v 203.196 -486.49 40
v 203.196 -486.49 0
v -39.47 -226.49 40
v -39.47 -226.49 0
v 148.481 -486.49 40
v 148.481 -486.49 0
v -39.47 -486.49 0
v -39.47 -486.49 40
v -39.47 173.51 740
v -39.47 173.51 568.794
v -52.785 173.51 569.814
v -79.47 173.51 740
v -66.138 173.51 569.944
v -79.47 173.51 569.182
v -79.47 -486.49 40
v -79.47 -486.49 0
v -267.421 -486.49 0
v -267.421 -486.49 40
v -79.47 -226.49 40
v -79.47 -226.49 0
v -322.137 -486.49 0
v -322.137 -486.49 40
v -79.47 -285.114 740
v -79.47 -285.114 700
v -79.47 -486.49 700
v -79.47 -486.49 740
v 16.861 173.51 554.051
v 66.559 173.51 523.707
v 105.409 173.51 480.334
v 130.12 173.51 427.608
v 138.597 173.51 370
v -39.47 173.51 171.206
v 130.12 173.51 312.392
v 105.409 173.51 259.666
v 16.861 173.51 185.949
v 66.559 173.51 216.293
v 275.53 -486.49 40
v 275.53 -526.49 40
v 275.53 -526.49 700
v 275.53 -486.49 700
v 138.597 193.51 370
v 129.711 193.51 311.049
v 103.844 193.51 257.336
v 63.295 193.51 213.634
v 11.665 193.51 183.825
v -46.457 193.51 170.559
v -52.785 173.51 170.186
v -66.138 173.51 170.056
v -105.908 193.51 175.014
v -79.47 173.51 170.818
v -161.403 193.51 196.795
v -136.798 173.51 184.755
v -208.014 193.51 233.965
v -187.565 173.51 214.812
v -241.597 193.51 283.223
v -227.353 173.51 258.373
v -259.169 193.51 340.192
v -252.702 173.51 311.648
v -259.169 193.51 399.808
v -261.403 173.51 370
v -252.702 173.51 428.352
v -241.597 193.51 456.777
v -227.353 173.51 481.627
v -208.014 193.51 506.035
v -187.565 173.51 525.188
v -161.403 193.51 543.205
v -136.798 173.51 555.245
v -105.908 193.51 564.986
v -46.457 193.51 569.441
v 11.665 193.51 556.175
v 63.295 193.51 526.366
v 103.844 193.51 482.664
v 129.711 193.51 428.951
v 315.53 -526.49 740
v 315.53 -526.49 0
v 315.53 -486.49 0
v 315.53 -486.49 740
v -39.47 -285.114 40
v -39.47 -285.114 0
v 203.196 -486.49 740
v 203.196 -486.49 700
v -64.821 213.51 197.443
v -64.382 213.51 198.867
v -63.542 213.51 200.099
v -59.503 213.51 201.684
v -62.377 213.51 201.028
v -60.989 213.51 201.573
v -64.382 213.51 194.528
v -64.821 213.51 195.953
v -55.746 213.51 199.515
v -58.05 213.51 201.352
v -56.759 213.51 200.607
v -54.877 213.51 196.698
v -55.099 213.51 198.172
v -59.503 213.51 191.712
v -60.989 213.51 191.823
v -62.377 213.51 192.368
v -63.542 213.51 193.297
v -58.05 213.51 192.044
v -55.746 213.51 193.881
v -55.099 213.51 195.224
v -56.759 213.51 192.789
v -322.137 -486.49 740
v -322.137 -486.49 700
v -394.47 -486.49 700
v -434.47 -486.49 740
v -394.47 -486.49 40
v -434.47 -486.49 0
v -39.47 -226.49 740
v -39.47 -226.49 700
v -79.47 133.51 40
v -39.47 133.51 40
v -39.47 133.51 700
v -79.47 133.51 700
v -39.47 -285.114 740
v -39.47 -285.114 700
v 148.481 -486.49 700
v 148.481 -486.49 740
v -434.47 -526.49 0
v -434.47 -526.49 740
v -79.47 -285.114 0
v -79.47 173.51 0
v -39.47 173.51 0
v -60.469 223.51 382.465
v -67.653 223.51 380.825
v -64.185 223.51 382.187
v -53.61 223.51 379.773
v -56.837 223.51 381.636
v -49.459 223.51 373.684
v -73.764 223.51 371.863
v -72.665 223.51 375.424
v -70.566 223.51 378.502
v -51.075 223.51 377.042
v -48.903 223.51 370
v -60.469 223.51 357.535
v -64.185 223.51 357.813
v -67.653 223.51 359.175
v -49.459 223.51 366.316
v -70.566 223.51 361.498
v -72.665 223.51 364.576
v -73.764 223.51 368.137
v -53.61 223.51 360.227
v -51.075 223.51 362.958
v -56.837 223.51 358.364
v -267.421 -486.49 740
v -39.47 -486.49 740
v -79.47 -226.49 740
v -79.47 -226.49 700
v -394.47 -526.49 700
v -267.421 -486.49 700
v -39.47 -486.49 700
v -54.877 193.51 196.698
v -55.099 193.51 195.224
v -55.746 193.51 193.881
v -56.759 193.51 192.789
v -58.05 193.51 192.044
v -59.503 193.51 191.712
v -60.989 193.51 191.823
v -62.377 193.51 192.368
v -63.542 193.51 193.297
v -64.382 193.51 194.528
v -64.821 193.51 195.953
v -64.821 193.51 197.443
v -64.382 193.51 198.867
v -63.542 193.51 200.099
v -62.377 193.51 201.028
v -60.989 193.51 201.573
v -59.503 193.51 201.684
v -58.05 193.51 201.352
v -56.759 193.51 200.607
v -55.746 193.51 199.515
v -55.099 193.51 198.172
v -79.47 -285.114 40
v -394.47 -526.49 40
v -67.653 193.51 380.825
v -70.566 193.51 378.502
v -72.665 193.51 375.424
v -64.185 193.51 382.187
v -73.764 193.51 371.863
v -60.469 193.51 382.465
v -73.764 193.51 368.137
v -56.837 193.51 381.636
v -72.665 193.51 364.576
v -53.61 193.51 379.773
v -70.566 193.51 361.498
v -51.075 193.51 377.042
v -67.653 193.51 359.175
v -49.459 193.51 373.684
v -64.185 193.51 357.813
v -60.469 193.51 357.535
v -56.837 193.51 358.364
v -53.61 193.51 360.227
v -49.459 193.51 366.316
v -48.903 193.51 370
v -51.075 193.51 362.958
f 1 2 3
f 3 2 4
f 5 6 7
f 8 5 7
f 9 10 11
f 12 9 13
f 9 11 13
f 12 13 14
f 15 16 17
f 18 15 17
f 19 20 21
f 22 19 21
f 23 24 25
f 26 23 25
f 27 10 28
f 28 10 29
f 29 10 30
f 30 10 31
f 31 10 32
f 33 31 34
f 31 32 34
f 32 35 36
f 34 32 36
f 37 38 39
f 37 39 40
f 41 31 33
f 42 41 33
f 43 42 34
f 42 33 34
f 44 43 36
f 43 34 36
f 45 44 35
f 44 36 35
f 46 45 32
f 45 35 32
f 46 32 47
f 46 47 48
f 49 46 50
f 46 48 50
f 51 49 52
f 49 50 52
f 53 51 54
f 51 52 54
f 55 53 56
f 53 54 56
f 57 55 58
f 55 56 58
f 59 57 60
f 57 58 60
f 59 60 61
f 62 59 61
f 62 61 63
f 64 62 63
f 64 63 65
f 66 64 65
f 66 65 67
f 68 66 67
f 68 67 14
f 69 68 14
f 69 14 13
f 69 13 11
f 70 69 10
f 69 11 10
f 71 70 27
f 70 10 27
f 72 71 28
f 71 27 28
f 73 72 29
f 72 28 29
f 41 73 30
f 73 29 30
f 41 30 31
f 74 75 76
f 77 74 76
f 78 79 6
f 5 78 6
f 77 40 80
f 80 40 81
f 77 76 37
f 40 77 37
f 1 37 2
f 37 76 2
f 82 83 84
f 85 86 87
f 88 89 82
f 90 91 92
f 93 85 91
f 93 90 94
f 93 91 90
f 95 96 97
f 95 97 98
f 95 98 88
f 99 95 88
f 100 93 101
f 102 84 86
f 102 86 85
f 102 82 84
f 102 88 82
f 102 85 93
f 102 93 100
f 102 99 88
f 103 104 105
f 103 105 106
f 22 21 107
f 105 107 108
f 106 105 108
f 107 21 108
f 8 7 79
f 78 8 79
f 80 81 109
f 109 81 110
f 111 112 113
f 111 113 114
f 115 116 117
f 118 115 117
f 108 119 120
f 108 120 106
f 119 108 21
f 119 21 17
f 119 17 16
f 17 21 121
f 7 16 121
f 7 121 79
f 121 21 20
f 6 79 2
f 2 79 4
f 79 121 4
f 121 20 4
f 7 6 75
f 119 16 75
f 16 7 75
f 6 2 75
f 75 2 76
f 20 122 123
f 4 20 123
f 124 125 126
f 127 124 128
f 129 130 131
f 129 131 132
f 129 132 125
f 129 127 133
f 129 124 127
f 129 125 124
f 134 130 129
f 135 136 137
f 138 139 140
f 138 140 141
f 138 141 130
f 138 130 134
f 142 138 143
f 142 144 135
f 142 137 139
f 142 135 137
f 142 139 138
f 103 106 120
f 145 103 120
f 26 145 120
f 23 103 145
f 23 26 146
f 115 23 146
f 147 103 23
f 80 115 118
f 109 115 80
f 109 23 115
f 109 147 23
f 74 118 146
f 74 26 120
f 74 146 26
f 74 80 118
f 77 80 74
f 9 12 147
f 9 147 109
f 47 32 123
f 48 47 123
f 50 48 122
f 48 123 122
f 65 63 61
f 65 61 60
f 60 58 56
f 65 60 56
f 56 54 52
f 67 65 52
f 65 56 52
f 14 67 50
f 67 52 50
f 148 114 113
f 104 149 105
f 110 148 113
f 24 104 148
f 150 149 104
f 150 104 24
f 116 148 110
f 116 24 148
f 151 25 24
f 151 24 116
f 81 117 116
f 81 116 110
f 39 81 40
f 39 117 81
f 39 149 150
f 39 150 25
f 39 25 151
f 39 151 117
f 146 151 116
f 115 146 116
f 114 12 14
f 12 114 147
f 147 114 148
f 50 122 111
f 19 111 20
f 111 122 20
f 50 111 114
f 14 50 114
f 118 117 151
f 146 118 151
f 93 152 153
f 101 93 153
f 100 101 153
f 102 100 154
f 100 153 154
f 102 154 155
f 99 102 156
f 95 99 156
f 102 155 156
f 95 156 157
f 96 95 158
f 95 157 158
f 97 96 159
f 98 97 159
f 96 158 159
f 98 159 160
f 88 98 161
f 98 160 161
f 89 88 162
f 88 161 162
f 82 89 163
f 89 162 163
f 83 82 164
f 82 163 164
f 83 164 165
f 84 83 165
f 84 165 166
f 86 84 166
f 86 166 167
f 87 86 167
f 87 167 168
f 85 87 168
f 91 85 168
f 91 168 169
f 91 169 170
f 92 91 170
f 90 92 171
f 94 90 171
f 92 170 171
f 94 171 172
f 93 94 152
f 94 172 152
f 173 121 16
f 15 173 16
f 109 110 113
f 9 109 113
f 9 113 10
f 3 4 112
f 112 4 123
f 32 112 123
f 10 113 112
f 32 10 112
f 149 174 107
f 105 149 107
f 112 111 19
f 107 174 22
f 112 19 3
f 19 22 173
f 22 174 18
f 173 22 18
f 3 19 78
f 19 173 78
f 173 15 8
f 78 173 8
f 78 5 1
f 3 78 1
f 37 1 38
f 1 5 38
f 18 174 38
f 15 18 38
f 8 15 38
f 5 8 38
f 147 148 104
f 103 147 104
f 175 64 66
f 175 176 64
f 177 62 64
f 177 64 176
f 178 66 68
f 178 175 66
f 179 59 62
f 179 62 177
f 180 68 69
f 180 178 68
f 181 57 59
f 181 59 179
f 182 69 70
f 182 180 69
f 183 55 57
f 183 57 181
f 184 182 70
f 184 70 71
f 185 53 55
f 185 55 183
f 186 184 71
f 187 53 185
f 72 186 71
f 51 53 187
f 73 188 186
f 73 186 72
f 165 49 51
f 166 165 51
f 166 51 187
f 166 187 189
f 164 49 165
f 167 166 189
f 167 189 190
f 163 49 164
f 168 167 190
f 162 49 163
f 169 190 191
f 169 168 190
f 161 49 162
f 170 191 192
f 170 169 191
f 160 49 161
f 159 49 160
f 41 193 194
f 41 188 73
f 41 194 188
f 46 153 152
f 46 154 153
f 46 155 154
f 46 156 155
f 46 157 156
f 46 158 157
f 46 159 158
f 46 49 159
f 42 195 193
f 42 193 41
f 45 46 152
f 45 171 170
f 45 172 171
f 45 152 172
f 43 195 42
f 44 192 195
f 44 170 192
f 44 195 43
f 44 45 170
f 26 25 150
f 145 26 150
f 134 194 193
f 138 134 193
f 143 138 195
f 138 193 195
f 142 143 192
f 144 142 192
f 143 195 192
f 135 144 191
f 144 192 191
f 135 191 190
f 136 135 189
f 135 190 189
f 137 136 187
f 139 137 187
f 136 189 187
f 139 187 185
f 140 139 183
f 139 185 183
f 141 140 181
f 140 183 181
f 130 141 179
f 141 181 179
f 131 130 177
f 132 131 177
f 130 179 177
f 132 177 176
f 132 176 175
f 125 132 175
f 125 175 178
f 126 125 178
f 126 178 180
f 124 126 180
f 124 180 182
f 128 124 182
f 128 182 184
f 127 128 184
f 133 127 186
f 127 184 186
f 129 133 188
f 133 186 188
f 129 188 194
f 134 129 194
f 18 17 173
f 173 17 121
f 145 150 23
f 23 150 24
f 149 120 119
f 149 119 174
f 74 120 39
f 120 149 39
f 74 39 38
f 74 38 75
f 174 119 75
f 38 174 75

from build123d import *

# Parameters (mm, degrees)
BOSS_EXTRUDE1_DEPTH  = 740
SKETCH2_W            = 720
SKETCH2_H            = 660
CUT_EXTRUDE1_DEPTH   = 760
SKETCH4_W            = 25
SKETCH4_H            = 40
CUT_EXTRUDE2_DEPTH   = 817
SKETCH5_W            = 40
SKETCH5_H            = 40
BOSS_EXTRUDE2_DEPTH  = 740
SKETCH6_W            = 40
SKETCH6_H            = 40
BOSS_EXTRUDE3_DEPTH  = 740
SKETCH7_R            = 200
BOSS_EXTRUDE5_DEPTH  = 20
SKETCH8_R            = 12.5
BOSS_EXTRUDE6_DEPTH  = 30
SKETCH9_R            = 5
BOSS_EXTRUDE10_DEPTH = 20


with BuildPart() as part:
    # Sketch1 → Boss-Extrude1 (new body)
    with BuildSketch(Plane.XY):
        Polygon((-79.470198675, 173.509933775), (-79.470198675, -226.490066225), (-322.136865342, -486.490066225), (-459.470198675, -486.490066225), (-459.470198675, -526.490066225), (340.529801325, -526.490066225), (340.529801325, -486.490066225), (203.196467991, -486.490066225), (-39.470198675, -226.490066225), (-39.470198675, 173.509933775), align=None)
        Polygon((-79.470198675, -486.490066225), (-267.421439932, -486.490066225), (-79.470198675, -285.113736307), align=None, mode=Mode.SUBTRACT)
        Polygon((148.481042581, -486.490066225), (-39.470198675, -486.490066225), (-39.470198675, -285.113736307), align=None, mode=Mode.SUBTRACT)
    extrude(amount=BOSS_EXTRUDE1_DEPTH)

    # Sketch2 → Cut-Extrude1 (cut)
    with BuildSketch(Plane.XZ.offset(526.490066225)):
        with Locations((-59.470198675, 370)):
            Rectangle(SKETCH2_W, SKETCH2_H)
    extrude(amount=-CUT_EXTRUDE1_DEPTH, mode=Mode.SUBTRACT)

    # Sketch4 → Cut-Extrude2 (cut)
    with BuildSketch(Plane(origin=(0, 0, 0), x_dir=(-1, 0, 0), z_dir=(0, 0, -1))):
        with Locations((-328.029801325, -506.490066225)):
            Rectangle(SKETCH4_W, SKETCH4_H)
        with Locations((446.970198675, -506.490066225)):
            Rectangle(SKETCH4_W, SKETCH4_H)
    extrude(amount=-CUT_EXTRUDE2_DEPTH, mode=Mode.SUBTRACT)

    # Sketch5 → Boss-Extrude2 (add)
    with BuildSketch(Plane(origin=(0, 0, 0), x_dir=(-1, 0, 0), z_dir=(0, 0, -1))):
        with Locations((-295.529801325, -506.490066225)):
            Rectangle(SKETCH5_W, SKETCH5_H)
        with Locations((414.470198675, -506.490066225)):
            Rectangle(SKETCH5_W, SKETCH5_H)
    extrude(amount=-BOSS_EXTRUDE2_DEPTH)

    # Sketch6 → Boss-Extrude3 (add)
    with BuildSketch(Plane(origin=(0, 0, 0), x_dir=(-1, 0, 0), z_dir=(0, 0, -1))):
        with Locations((59.470198675, 153.509933775)):
            Rectangle(SKETCH6_W, SKETCH6_H)
    extrude(amount=-BOSS_EXTRUDE3_DEPTH)

    # Sketch7 → Boss-Extrude5 (add)
    with BuildSketch(Plane(origin=(0, 173.509933775, 0), x_dir=(1, 0, 0), z_dir=(0, 1, 0))):
        with Locations((-61.40332894, -370)):
            Circle(SKETCH7_R)
    extrude(amount=BOSS_EXTRUDE5_DEPTH)

    # Sketch8 → Boss-Extrude6 (add)
    with BuildSketch(Plane(origin=(0, 193.509933775, 0), x_dir=(1, 0, 0), z_dir=(0, 1, 0))):
        with Locations((-61.40332894, -370)):
            Circle(SKETCH8_R)
    extrude(amount=BOSS_EXTRUDE6_DEPTH)

    # Sketch9 → Boss-Extrude10 (add)
    with BuildSketch(Plane(origin=(0, 193.509933775, 0), x_dir=(1, 0, 0), z_dir=(0, 1, 0))):
        with Locations((-59.876755941, -196.697911229)):
            Circle(SKETCH9_R)
    extrude(amount=BOSS_EXTRUDE10_DEPTH)


solid = part.part
